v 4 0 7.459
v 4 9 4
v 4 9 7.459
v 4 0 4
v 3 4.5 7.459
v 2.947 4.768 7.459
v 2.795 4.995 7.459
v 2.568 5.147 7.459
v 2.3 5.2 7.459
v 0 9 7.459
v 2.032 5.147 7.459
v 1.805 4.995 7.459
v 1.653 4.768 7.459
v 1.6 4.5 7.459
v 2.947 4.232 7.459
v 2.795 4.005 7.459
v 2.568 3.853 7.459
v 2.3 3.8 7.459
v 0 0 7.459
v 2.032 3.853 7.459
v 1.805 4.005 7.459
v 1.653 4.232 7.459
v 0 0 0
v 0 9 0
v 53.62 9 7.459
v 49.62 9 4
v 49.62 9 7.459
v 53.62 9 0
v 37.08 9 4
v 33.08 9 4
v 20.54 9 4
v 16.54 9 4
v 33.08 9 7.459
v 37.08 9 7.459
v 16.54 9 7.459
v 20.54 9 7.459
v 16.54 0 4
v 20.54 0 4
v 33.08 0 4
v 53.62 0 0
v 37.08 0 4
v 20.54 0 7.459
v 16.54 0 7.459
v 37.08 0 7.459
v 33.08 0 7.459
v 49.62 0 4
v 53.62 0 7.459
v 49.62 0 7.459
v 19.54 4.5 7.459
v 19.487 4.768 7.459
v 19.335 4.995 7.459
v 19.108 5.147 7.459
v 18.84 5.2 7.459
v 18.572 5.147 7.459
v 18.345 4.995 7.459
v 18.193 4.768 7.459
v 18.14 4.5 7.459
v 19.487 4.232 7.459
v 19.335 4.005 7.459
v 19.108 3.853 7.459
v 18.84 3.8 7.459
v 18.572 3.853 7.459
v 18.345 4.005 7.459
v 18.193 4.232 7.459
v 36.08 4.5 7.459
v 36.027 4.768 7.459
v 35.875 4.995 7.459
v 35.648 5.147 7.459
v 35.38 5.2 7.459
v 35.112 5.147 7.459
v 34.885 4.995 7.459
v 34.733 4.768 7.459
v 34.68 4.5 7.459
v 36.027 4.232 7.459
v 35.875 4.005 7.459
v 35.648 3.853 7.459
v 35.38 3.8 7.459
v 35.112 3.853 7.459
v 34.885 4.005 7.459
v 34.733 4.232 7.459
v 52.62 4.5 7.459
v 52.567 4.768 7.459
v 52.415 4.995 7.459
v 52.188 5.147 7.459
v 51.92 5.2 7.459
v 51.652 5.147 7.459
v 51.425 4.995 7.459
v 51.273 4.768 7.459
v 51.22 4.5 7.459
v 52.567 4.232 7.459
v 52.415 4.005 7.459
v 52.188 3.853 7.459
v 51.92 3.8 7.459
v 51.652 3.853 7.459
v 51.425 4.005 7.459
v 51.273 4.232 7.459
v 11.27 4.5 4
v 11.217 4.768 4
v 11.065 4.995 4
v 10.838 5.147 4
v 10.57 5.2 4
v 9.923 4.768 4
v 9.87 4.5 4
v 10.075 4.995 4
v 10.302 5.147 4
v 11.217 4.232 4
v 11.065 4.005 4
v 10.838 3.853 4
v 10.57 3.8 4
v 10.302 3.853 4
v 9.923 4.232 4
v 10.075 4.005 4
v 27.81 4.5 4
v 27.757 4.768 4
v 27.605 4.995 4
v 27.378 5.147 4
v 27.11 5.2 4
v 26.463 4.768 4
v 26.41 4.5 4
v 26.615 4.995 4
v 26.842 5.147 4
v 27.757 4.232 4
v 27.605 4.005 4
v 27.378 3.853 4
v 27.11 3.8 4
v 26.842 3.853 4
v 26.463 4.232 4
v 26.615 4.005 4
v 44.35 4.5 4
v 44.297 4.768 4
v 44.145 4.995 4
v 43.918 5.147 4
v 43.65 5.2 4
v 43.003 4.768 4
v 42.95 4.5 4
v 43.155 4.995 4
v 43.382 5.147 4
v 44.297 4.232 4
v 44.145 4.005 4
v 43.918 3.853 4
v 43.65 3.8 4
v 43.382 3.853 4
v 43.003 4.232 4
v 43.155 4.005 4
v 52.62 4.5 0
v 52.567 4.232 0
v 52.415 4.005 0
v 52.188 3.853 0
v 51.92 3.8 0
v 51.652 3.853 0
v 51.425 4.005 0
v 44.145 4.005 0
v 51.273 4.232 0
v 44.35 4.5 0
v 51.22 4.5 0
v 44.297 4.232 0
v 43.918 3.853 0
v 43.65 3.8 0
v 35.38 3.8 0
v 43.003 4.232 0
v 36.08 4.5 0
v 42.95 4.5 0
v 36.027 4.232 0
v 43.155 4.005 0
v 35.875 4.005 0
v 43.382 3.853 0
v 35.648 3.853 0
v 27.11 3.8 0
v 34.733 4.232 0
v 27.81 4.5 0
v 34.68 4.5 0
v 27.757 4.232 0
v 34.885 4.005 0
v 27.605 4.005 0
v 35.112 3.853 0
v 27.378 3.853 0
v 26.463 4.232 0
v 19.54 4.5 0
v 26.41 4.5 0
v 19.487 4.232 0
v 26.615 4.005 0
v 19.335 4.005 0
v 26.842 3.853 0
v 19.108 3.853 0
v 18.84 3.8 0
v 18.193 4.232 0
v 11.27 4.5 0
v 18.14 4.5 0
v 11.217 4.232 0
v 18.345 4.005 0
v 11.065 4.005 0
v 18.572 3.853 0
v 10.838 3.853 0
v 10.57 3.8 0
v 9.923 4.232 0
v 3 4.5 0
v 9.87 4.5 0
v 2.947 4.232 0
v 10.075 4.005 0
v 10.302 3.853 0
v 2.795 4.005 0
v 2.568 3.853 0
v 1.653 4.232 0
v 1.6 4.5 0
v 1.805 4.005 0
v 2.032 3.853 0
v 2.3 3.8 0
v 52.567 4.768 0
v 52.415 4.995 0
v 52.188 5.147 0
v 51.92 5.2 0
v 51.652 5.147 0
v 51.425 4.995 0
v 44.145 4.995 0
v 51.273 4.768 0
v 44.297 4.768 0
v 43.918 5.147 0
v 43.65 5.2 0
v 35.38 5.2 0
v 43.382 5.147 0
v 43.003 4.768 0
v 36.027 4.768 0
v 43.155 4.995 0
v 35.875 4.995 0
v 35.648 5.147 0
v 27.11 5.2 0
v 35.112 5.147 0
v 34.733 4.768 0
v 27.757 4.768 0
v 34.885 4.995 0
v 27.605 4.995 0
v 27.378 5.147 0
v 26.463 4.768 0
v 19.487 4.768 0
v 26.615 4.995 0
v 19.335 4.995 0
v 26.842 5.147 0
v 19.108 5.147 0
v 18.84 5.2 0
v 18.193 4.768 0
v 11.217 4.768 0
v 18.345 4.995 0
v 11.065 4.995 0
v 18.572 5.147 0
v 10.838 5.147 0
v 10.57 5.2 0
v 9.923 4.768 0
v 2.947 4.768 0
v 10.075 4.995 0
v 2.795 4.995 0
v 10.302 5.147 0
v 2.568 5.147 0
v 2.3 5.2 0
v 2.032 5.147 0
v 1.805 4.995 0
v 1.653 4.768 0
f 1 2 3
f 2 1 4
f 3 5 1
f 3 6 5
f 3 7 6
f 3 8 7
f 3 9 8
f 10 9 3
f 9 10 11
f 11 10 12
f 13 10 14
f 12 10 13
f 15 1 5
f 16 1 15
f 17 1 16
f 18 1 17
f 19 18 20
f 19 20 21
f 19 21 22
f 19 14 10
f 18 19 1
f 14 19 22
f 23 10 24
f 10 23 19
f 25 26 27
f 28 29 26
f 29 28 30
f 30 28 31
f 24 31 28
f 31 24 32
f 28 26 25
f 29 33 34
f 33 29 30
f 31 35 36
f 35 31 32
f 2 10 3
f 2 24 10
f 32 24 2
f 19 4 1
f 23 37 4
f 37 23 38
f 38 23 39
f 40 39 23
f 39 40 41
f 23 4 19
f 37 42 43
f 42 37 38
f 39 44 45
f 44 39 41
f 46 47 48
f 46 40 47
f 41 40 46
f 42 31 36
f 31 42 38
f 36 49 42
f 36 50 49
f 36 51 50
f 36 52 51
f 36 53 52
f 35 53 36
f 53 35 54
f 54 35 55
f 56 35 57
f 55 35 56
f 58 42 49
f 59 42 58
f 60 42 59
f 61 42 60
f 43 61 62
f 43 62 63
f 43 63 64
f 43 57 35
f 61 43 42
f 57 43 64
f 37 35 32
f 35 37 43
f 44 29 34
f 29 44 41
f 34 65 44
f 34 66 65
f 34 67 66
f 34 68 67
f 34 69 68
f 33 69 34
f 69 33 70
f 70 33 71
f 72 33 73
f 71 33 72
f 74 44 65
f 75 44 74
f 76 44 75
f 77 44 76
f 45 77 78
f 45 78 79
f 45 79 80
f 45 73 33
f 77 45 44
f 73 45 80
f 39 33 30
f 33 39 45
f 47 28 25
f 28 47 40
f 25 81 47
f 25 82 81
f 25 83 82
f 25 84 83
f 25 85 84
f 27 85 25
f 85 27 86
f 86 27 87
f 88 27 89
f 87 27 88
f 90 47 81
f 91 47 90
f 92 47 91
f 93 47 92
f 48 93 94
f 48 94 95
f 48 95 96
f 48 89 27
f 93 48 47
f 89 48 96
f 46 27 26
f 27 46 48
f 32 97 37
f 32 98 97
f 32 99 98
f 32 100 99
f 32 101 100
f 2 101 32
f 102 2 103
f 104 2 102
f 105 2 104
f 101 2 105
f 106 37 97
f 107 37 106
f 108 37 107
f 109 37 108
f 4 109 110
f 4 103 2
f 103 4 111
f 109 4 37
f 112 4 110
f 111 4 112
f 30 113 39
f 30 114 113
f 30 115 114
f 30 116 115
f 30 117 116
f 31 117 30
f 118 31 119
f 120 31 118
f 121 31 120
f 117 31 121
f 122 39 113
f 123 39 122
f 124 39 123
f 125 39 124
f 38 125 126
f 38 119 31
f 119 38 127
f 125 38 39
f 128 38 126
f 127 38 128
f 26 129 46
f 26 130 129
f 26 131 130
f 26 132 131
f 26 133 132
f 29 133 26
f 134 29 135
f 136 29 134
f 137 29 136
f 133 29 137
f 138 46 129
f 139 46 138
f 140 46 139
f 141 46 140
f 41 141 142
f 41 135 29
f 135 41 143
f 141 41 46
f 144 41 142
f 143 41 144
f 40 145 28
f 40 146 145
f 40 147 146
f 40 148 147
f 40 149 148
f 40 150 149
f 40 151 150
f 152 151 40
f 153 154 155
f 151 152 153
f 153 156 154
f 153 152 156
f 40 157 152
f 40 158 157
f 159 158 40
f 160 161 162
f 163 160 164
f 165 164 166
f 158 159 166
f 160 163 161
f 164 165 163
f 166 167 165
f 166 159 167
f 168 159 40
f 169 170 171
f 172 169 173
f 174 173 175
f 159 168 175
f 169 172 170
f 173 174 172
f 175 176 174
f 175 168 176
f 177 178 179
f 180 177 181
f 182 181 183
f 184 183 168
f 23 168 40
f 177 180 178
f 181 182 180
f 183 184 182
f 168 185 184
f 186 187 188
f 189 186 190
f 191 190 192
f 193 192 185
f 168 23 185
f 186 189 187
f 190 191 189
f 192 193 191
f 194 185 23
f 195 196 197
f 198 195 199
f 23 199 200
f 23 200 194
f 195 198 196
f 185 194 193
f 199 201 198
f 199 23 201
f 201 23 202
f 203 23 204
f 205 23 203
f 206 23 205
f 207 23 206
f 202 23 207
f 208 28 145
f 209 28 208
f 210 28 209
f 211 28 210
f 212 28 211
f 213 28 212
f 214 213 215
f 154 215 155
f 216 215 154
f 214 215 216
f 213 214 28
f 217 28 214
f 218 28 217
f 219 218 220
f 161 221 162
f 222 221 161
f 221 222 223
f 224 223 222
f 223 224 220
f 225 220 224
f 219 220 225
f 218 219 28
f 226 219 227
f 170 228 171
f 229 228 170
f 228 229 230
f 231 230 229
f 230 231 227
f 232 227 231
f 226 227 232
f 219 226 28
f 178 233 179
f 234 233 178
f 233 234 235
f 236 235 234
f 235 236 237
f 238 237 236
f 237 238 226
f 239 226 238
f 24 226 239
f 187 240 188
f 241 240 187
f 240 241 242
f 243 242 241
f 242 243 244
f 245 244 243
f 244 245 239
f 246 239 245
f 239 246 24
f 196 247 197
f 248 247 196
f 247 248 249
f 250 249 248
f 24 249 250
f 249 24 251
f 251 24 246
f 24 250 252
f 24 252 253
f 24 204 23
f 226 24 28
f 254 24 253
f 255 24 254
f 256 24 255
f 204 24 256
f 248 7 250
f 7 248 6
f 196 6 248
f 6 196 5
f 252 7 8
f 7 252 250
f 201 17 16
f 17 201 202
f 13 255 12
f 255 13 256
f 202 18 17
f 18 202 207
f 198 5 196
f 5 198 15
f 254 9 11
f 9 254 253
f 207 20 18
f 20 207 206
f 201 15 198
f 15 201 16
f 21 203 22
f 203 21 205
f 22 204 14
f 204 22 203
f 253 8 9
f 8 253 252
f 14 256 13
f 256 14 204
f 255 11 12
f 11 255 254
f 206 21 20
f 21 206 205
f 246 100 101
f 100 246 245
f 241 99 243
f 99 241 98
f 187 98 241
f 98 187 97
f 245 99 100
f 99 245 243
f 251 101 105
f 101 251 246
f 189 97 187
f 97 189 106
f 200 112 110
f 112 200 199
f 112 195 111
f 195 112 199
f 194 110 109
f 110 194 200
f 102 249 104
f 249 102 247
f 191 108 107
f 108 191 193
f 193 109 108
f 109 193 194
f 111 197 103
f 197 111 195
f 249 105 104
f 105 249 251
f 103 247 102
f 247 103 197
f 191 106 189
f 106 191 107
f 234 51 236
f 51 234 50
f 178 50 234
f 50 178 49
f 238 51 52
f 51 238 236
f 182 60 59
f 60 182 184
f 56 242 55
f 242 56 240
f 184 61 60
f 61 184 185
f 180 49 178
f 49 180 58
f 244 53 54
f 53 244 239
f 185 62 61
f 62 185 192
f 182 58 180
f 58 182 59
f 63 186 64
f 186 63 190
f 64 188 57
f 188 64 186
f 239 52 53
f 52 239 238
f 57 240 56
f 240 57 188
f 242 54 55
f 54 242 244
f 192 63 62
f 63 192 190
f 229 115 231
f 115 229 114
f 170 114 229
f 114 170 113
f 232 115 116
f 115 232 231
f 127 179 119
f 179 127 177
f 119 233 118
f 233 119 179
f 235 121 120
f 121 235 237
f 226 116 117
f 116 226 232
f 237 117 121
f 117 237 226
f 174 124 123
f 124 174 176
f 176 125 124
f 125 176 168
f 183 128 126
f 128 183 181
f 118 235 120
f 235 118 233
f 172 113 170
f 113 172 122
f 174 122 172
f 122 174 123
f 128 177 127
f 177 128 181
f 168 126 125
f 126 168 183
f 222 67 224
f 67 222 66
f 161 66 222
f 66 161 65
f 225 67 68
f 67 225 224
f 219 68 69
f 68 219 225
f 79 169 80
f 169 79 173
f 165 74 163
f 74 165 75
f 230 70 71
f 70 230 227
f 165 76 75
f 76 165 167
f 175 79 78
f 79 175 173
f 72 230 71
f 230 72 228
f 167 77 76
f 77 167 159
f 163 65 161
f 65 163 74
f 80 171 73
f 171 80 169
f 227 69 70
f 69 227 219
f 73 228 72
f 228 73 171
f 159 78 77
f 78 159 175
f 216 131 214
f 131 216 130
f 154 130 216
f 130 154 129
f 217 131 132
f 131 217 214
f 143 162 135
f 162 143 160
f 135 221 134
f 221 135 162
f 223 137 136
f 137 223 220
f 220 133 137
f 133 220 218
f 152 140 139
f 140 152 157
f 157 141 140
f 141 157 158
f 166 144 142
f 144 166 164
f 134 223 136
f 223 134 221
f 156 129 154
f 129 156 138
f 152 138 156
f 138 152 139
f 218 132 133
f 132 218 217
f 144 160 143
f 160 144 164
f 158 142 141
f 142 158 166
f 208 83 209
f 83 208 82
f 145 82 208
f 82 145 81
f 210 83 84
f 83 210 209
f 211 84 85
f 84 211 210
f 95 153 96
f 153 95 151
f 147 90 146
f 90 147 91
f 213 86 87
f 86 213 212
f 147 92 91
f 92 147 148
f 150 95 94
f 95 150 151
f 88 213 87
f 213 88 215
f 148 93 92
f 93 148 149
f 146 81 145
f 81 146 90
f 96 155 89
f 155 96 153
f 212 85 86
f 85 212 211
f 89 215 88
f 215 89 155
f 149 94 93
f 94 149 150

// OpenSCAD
buttonWidth = 11.94;
spacing = 4;
screwSize = 1.4;
buttonThickness = 3.96;
buttonTensioning = 0.5;
tolerance = 0.3;
stripWidth = 9;
thickness = 4;
buttonCount = 3;

module dummy() {}

nudge = 0.001;

length = buttonCount * (buttonWidth+2*tolerance) + (1+buttonCount) * spacing;
echo(length);
module main() {
    cube([length,stripWidth,thickness]);
    for (i=[0:buttonCount]) {
        x = (spacing+buttonWidth+2*tolerance)*i;
        translate([x,0,thickness-nudge]) cube([spacing,stripWidth,buttonThickness-buttonTensioning]);
    }
}

render(convexity=2)
difference() {
    main();
    for (i=[0:buttonCount]) {
        x = (spacing+buttonWidth+2*tolerance)*i+tolerance+spacing/2;
        translate([x,stripWidth/2,-nudge]) cylinder(d=screwSize,h=2*nudge+buttonThickness+thickness,$fn=16);
        if (i<buttonCount) {
        translate([x+spacing/2+buttonWidth/2+tolerance,stripWidth/2,-nudge]) cylinder(d=screwSize,h=2*nudge+buttonThickness+thickness,$fn=16);
        }
    }
}
